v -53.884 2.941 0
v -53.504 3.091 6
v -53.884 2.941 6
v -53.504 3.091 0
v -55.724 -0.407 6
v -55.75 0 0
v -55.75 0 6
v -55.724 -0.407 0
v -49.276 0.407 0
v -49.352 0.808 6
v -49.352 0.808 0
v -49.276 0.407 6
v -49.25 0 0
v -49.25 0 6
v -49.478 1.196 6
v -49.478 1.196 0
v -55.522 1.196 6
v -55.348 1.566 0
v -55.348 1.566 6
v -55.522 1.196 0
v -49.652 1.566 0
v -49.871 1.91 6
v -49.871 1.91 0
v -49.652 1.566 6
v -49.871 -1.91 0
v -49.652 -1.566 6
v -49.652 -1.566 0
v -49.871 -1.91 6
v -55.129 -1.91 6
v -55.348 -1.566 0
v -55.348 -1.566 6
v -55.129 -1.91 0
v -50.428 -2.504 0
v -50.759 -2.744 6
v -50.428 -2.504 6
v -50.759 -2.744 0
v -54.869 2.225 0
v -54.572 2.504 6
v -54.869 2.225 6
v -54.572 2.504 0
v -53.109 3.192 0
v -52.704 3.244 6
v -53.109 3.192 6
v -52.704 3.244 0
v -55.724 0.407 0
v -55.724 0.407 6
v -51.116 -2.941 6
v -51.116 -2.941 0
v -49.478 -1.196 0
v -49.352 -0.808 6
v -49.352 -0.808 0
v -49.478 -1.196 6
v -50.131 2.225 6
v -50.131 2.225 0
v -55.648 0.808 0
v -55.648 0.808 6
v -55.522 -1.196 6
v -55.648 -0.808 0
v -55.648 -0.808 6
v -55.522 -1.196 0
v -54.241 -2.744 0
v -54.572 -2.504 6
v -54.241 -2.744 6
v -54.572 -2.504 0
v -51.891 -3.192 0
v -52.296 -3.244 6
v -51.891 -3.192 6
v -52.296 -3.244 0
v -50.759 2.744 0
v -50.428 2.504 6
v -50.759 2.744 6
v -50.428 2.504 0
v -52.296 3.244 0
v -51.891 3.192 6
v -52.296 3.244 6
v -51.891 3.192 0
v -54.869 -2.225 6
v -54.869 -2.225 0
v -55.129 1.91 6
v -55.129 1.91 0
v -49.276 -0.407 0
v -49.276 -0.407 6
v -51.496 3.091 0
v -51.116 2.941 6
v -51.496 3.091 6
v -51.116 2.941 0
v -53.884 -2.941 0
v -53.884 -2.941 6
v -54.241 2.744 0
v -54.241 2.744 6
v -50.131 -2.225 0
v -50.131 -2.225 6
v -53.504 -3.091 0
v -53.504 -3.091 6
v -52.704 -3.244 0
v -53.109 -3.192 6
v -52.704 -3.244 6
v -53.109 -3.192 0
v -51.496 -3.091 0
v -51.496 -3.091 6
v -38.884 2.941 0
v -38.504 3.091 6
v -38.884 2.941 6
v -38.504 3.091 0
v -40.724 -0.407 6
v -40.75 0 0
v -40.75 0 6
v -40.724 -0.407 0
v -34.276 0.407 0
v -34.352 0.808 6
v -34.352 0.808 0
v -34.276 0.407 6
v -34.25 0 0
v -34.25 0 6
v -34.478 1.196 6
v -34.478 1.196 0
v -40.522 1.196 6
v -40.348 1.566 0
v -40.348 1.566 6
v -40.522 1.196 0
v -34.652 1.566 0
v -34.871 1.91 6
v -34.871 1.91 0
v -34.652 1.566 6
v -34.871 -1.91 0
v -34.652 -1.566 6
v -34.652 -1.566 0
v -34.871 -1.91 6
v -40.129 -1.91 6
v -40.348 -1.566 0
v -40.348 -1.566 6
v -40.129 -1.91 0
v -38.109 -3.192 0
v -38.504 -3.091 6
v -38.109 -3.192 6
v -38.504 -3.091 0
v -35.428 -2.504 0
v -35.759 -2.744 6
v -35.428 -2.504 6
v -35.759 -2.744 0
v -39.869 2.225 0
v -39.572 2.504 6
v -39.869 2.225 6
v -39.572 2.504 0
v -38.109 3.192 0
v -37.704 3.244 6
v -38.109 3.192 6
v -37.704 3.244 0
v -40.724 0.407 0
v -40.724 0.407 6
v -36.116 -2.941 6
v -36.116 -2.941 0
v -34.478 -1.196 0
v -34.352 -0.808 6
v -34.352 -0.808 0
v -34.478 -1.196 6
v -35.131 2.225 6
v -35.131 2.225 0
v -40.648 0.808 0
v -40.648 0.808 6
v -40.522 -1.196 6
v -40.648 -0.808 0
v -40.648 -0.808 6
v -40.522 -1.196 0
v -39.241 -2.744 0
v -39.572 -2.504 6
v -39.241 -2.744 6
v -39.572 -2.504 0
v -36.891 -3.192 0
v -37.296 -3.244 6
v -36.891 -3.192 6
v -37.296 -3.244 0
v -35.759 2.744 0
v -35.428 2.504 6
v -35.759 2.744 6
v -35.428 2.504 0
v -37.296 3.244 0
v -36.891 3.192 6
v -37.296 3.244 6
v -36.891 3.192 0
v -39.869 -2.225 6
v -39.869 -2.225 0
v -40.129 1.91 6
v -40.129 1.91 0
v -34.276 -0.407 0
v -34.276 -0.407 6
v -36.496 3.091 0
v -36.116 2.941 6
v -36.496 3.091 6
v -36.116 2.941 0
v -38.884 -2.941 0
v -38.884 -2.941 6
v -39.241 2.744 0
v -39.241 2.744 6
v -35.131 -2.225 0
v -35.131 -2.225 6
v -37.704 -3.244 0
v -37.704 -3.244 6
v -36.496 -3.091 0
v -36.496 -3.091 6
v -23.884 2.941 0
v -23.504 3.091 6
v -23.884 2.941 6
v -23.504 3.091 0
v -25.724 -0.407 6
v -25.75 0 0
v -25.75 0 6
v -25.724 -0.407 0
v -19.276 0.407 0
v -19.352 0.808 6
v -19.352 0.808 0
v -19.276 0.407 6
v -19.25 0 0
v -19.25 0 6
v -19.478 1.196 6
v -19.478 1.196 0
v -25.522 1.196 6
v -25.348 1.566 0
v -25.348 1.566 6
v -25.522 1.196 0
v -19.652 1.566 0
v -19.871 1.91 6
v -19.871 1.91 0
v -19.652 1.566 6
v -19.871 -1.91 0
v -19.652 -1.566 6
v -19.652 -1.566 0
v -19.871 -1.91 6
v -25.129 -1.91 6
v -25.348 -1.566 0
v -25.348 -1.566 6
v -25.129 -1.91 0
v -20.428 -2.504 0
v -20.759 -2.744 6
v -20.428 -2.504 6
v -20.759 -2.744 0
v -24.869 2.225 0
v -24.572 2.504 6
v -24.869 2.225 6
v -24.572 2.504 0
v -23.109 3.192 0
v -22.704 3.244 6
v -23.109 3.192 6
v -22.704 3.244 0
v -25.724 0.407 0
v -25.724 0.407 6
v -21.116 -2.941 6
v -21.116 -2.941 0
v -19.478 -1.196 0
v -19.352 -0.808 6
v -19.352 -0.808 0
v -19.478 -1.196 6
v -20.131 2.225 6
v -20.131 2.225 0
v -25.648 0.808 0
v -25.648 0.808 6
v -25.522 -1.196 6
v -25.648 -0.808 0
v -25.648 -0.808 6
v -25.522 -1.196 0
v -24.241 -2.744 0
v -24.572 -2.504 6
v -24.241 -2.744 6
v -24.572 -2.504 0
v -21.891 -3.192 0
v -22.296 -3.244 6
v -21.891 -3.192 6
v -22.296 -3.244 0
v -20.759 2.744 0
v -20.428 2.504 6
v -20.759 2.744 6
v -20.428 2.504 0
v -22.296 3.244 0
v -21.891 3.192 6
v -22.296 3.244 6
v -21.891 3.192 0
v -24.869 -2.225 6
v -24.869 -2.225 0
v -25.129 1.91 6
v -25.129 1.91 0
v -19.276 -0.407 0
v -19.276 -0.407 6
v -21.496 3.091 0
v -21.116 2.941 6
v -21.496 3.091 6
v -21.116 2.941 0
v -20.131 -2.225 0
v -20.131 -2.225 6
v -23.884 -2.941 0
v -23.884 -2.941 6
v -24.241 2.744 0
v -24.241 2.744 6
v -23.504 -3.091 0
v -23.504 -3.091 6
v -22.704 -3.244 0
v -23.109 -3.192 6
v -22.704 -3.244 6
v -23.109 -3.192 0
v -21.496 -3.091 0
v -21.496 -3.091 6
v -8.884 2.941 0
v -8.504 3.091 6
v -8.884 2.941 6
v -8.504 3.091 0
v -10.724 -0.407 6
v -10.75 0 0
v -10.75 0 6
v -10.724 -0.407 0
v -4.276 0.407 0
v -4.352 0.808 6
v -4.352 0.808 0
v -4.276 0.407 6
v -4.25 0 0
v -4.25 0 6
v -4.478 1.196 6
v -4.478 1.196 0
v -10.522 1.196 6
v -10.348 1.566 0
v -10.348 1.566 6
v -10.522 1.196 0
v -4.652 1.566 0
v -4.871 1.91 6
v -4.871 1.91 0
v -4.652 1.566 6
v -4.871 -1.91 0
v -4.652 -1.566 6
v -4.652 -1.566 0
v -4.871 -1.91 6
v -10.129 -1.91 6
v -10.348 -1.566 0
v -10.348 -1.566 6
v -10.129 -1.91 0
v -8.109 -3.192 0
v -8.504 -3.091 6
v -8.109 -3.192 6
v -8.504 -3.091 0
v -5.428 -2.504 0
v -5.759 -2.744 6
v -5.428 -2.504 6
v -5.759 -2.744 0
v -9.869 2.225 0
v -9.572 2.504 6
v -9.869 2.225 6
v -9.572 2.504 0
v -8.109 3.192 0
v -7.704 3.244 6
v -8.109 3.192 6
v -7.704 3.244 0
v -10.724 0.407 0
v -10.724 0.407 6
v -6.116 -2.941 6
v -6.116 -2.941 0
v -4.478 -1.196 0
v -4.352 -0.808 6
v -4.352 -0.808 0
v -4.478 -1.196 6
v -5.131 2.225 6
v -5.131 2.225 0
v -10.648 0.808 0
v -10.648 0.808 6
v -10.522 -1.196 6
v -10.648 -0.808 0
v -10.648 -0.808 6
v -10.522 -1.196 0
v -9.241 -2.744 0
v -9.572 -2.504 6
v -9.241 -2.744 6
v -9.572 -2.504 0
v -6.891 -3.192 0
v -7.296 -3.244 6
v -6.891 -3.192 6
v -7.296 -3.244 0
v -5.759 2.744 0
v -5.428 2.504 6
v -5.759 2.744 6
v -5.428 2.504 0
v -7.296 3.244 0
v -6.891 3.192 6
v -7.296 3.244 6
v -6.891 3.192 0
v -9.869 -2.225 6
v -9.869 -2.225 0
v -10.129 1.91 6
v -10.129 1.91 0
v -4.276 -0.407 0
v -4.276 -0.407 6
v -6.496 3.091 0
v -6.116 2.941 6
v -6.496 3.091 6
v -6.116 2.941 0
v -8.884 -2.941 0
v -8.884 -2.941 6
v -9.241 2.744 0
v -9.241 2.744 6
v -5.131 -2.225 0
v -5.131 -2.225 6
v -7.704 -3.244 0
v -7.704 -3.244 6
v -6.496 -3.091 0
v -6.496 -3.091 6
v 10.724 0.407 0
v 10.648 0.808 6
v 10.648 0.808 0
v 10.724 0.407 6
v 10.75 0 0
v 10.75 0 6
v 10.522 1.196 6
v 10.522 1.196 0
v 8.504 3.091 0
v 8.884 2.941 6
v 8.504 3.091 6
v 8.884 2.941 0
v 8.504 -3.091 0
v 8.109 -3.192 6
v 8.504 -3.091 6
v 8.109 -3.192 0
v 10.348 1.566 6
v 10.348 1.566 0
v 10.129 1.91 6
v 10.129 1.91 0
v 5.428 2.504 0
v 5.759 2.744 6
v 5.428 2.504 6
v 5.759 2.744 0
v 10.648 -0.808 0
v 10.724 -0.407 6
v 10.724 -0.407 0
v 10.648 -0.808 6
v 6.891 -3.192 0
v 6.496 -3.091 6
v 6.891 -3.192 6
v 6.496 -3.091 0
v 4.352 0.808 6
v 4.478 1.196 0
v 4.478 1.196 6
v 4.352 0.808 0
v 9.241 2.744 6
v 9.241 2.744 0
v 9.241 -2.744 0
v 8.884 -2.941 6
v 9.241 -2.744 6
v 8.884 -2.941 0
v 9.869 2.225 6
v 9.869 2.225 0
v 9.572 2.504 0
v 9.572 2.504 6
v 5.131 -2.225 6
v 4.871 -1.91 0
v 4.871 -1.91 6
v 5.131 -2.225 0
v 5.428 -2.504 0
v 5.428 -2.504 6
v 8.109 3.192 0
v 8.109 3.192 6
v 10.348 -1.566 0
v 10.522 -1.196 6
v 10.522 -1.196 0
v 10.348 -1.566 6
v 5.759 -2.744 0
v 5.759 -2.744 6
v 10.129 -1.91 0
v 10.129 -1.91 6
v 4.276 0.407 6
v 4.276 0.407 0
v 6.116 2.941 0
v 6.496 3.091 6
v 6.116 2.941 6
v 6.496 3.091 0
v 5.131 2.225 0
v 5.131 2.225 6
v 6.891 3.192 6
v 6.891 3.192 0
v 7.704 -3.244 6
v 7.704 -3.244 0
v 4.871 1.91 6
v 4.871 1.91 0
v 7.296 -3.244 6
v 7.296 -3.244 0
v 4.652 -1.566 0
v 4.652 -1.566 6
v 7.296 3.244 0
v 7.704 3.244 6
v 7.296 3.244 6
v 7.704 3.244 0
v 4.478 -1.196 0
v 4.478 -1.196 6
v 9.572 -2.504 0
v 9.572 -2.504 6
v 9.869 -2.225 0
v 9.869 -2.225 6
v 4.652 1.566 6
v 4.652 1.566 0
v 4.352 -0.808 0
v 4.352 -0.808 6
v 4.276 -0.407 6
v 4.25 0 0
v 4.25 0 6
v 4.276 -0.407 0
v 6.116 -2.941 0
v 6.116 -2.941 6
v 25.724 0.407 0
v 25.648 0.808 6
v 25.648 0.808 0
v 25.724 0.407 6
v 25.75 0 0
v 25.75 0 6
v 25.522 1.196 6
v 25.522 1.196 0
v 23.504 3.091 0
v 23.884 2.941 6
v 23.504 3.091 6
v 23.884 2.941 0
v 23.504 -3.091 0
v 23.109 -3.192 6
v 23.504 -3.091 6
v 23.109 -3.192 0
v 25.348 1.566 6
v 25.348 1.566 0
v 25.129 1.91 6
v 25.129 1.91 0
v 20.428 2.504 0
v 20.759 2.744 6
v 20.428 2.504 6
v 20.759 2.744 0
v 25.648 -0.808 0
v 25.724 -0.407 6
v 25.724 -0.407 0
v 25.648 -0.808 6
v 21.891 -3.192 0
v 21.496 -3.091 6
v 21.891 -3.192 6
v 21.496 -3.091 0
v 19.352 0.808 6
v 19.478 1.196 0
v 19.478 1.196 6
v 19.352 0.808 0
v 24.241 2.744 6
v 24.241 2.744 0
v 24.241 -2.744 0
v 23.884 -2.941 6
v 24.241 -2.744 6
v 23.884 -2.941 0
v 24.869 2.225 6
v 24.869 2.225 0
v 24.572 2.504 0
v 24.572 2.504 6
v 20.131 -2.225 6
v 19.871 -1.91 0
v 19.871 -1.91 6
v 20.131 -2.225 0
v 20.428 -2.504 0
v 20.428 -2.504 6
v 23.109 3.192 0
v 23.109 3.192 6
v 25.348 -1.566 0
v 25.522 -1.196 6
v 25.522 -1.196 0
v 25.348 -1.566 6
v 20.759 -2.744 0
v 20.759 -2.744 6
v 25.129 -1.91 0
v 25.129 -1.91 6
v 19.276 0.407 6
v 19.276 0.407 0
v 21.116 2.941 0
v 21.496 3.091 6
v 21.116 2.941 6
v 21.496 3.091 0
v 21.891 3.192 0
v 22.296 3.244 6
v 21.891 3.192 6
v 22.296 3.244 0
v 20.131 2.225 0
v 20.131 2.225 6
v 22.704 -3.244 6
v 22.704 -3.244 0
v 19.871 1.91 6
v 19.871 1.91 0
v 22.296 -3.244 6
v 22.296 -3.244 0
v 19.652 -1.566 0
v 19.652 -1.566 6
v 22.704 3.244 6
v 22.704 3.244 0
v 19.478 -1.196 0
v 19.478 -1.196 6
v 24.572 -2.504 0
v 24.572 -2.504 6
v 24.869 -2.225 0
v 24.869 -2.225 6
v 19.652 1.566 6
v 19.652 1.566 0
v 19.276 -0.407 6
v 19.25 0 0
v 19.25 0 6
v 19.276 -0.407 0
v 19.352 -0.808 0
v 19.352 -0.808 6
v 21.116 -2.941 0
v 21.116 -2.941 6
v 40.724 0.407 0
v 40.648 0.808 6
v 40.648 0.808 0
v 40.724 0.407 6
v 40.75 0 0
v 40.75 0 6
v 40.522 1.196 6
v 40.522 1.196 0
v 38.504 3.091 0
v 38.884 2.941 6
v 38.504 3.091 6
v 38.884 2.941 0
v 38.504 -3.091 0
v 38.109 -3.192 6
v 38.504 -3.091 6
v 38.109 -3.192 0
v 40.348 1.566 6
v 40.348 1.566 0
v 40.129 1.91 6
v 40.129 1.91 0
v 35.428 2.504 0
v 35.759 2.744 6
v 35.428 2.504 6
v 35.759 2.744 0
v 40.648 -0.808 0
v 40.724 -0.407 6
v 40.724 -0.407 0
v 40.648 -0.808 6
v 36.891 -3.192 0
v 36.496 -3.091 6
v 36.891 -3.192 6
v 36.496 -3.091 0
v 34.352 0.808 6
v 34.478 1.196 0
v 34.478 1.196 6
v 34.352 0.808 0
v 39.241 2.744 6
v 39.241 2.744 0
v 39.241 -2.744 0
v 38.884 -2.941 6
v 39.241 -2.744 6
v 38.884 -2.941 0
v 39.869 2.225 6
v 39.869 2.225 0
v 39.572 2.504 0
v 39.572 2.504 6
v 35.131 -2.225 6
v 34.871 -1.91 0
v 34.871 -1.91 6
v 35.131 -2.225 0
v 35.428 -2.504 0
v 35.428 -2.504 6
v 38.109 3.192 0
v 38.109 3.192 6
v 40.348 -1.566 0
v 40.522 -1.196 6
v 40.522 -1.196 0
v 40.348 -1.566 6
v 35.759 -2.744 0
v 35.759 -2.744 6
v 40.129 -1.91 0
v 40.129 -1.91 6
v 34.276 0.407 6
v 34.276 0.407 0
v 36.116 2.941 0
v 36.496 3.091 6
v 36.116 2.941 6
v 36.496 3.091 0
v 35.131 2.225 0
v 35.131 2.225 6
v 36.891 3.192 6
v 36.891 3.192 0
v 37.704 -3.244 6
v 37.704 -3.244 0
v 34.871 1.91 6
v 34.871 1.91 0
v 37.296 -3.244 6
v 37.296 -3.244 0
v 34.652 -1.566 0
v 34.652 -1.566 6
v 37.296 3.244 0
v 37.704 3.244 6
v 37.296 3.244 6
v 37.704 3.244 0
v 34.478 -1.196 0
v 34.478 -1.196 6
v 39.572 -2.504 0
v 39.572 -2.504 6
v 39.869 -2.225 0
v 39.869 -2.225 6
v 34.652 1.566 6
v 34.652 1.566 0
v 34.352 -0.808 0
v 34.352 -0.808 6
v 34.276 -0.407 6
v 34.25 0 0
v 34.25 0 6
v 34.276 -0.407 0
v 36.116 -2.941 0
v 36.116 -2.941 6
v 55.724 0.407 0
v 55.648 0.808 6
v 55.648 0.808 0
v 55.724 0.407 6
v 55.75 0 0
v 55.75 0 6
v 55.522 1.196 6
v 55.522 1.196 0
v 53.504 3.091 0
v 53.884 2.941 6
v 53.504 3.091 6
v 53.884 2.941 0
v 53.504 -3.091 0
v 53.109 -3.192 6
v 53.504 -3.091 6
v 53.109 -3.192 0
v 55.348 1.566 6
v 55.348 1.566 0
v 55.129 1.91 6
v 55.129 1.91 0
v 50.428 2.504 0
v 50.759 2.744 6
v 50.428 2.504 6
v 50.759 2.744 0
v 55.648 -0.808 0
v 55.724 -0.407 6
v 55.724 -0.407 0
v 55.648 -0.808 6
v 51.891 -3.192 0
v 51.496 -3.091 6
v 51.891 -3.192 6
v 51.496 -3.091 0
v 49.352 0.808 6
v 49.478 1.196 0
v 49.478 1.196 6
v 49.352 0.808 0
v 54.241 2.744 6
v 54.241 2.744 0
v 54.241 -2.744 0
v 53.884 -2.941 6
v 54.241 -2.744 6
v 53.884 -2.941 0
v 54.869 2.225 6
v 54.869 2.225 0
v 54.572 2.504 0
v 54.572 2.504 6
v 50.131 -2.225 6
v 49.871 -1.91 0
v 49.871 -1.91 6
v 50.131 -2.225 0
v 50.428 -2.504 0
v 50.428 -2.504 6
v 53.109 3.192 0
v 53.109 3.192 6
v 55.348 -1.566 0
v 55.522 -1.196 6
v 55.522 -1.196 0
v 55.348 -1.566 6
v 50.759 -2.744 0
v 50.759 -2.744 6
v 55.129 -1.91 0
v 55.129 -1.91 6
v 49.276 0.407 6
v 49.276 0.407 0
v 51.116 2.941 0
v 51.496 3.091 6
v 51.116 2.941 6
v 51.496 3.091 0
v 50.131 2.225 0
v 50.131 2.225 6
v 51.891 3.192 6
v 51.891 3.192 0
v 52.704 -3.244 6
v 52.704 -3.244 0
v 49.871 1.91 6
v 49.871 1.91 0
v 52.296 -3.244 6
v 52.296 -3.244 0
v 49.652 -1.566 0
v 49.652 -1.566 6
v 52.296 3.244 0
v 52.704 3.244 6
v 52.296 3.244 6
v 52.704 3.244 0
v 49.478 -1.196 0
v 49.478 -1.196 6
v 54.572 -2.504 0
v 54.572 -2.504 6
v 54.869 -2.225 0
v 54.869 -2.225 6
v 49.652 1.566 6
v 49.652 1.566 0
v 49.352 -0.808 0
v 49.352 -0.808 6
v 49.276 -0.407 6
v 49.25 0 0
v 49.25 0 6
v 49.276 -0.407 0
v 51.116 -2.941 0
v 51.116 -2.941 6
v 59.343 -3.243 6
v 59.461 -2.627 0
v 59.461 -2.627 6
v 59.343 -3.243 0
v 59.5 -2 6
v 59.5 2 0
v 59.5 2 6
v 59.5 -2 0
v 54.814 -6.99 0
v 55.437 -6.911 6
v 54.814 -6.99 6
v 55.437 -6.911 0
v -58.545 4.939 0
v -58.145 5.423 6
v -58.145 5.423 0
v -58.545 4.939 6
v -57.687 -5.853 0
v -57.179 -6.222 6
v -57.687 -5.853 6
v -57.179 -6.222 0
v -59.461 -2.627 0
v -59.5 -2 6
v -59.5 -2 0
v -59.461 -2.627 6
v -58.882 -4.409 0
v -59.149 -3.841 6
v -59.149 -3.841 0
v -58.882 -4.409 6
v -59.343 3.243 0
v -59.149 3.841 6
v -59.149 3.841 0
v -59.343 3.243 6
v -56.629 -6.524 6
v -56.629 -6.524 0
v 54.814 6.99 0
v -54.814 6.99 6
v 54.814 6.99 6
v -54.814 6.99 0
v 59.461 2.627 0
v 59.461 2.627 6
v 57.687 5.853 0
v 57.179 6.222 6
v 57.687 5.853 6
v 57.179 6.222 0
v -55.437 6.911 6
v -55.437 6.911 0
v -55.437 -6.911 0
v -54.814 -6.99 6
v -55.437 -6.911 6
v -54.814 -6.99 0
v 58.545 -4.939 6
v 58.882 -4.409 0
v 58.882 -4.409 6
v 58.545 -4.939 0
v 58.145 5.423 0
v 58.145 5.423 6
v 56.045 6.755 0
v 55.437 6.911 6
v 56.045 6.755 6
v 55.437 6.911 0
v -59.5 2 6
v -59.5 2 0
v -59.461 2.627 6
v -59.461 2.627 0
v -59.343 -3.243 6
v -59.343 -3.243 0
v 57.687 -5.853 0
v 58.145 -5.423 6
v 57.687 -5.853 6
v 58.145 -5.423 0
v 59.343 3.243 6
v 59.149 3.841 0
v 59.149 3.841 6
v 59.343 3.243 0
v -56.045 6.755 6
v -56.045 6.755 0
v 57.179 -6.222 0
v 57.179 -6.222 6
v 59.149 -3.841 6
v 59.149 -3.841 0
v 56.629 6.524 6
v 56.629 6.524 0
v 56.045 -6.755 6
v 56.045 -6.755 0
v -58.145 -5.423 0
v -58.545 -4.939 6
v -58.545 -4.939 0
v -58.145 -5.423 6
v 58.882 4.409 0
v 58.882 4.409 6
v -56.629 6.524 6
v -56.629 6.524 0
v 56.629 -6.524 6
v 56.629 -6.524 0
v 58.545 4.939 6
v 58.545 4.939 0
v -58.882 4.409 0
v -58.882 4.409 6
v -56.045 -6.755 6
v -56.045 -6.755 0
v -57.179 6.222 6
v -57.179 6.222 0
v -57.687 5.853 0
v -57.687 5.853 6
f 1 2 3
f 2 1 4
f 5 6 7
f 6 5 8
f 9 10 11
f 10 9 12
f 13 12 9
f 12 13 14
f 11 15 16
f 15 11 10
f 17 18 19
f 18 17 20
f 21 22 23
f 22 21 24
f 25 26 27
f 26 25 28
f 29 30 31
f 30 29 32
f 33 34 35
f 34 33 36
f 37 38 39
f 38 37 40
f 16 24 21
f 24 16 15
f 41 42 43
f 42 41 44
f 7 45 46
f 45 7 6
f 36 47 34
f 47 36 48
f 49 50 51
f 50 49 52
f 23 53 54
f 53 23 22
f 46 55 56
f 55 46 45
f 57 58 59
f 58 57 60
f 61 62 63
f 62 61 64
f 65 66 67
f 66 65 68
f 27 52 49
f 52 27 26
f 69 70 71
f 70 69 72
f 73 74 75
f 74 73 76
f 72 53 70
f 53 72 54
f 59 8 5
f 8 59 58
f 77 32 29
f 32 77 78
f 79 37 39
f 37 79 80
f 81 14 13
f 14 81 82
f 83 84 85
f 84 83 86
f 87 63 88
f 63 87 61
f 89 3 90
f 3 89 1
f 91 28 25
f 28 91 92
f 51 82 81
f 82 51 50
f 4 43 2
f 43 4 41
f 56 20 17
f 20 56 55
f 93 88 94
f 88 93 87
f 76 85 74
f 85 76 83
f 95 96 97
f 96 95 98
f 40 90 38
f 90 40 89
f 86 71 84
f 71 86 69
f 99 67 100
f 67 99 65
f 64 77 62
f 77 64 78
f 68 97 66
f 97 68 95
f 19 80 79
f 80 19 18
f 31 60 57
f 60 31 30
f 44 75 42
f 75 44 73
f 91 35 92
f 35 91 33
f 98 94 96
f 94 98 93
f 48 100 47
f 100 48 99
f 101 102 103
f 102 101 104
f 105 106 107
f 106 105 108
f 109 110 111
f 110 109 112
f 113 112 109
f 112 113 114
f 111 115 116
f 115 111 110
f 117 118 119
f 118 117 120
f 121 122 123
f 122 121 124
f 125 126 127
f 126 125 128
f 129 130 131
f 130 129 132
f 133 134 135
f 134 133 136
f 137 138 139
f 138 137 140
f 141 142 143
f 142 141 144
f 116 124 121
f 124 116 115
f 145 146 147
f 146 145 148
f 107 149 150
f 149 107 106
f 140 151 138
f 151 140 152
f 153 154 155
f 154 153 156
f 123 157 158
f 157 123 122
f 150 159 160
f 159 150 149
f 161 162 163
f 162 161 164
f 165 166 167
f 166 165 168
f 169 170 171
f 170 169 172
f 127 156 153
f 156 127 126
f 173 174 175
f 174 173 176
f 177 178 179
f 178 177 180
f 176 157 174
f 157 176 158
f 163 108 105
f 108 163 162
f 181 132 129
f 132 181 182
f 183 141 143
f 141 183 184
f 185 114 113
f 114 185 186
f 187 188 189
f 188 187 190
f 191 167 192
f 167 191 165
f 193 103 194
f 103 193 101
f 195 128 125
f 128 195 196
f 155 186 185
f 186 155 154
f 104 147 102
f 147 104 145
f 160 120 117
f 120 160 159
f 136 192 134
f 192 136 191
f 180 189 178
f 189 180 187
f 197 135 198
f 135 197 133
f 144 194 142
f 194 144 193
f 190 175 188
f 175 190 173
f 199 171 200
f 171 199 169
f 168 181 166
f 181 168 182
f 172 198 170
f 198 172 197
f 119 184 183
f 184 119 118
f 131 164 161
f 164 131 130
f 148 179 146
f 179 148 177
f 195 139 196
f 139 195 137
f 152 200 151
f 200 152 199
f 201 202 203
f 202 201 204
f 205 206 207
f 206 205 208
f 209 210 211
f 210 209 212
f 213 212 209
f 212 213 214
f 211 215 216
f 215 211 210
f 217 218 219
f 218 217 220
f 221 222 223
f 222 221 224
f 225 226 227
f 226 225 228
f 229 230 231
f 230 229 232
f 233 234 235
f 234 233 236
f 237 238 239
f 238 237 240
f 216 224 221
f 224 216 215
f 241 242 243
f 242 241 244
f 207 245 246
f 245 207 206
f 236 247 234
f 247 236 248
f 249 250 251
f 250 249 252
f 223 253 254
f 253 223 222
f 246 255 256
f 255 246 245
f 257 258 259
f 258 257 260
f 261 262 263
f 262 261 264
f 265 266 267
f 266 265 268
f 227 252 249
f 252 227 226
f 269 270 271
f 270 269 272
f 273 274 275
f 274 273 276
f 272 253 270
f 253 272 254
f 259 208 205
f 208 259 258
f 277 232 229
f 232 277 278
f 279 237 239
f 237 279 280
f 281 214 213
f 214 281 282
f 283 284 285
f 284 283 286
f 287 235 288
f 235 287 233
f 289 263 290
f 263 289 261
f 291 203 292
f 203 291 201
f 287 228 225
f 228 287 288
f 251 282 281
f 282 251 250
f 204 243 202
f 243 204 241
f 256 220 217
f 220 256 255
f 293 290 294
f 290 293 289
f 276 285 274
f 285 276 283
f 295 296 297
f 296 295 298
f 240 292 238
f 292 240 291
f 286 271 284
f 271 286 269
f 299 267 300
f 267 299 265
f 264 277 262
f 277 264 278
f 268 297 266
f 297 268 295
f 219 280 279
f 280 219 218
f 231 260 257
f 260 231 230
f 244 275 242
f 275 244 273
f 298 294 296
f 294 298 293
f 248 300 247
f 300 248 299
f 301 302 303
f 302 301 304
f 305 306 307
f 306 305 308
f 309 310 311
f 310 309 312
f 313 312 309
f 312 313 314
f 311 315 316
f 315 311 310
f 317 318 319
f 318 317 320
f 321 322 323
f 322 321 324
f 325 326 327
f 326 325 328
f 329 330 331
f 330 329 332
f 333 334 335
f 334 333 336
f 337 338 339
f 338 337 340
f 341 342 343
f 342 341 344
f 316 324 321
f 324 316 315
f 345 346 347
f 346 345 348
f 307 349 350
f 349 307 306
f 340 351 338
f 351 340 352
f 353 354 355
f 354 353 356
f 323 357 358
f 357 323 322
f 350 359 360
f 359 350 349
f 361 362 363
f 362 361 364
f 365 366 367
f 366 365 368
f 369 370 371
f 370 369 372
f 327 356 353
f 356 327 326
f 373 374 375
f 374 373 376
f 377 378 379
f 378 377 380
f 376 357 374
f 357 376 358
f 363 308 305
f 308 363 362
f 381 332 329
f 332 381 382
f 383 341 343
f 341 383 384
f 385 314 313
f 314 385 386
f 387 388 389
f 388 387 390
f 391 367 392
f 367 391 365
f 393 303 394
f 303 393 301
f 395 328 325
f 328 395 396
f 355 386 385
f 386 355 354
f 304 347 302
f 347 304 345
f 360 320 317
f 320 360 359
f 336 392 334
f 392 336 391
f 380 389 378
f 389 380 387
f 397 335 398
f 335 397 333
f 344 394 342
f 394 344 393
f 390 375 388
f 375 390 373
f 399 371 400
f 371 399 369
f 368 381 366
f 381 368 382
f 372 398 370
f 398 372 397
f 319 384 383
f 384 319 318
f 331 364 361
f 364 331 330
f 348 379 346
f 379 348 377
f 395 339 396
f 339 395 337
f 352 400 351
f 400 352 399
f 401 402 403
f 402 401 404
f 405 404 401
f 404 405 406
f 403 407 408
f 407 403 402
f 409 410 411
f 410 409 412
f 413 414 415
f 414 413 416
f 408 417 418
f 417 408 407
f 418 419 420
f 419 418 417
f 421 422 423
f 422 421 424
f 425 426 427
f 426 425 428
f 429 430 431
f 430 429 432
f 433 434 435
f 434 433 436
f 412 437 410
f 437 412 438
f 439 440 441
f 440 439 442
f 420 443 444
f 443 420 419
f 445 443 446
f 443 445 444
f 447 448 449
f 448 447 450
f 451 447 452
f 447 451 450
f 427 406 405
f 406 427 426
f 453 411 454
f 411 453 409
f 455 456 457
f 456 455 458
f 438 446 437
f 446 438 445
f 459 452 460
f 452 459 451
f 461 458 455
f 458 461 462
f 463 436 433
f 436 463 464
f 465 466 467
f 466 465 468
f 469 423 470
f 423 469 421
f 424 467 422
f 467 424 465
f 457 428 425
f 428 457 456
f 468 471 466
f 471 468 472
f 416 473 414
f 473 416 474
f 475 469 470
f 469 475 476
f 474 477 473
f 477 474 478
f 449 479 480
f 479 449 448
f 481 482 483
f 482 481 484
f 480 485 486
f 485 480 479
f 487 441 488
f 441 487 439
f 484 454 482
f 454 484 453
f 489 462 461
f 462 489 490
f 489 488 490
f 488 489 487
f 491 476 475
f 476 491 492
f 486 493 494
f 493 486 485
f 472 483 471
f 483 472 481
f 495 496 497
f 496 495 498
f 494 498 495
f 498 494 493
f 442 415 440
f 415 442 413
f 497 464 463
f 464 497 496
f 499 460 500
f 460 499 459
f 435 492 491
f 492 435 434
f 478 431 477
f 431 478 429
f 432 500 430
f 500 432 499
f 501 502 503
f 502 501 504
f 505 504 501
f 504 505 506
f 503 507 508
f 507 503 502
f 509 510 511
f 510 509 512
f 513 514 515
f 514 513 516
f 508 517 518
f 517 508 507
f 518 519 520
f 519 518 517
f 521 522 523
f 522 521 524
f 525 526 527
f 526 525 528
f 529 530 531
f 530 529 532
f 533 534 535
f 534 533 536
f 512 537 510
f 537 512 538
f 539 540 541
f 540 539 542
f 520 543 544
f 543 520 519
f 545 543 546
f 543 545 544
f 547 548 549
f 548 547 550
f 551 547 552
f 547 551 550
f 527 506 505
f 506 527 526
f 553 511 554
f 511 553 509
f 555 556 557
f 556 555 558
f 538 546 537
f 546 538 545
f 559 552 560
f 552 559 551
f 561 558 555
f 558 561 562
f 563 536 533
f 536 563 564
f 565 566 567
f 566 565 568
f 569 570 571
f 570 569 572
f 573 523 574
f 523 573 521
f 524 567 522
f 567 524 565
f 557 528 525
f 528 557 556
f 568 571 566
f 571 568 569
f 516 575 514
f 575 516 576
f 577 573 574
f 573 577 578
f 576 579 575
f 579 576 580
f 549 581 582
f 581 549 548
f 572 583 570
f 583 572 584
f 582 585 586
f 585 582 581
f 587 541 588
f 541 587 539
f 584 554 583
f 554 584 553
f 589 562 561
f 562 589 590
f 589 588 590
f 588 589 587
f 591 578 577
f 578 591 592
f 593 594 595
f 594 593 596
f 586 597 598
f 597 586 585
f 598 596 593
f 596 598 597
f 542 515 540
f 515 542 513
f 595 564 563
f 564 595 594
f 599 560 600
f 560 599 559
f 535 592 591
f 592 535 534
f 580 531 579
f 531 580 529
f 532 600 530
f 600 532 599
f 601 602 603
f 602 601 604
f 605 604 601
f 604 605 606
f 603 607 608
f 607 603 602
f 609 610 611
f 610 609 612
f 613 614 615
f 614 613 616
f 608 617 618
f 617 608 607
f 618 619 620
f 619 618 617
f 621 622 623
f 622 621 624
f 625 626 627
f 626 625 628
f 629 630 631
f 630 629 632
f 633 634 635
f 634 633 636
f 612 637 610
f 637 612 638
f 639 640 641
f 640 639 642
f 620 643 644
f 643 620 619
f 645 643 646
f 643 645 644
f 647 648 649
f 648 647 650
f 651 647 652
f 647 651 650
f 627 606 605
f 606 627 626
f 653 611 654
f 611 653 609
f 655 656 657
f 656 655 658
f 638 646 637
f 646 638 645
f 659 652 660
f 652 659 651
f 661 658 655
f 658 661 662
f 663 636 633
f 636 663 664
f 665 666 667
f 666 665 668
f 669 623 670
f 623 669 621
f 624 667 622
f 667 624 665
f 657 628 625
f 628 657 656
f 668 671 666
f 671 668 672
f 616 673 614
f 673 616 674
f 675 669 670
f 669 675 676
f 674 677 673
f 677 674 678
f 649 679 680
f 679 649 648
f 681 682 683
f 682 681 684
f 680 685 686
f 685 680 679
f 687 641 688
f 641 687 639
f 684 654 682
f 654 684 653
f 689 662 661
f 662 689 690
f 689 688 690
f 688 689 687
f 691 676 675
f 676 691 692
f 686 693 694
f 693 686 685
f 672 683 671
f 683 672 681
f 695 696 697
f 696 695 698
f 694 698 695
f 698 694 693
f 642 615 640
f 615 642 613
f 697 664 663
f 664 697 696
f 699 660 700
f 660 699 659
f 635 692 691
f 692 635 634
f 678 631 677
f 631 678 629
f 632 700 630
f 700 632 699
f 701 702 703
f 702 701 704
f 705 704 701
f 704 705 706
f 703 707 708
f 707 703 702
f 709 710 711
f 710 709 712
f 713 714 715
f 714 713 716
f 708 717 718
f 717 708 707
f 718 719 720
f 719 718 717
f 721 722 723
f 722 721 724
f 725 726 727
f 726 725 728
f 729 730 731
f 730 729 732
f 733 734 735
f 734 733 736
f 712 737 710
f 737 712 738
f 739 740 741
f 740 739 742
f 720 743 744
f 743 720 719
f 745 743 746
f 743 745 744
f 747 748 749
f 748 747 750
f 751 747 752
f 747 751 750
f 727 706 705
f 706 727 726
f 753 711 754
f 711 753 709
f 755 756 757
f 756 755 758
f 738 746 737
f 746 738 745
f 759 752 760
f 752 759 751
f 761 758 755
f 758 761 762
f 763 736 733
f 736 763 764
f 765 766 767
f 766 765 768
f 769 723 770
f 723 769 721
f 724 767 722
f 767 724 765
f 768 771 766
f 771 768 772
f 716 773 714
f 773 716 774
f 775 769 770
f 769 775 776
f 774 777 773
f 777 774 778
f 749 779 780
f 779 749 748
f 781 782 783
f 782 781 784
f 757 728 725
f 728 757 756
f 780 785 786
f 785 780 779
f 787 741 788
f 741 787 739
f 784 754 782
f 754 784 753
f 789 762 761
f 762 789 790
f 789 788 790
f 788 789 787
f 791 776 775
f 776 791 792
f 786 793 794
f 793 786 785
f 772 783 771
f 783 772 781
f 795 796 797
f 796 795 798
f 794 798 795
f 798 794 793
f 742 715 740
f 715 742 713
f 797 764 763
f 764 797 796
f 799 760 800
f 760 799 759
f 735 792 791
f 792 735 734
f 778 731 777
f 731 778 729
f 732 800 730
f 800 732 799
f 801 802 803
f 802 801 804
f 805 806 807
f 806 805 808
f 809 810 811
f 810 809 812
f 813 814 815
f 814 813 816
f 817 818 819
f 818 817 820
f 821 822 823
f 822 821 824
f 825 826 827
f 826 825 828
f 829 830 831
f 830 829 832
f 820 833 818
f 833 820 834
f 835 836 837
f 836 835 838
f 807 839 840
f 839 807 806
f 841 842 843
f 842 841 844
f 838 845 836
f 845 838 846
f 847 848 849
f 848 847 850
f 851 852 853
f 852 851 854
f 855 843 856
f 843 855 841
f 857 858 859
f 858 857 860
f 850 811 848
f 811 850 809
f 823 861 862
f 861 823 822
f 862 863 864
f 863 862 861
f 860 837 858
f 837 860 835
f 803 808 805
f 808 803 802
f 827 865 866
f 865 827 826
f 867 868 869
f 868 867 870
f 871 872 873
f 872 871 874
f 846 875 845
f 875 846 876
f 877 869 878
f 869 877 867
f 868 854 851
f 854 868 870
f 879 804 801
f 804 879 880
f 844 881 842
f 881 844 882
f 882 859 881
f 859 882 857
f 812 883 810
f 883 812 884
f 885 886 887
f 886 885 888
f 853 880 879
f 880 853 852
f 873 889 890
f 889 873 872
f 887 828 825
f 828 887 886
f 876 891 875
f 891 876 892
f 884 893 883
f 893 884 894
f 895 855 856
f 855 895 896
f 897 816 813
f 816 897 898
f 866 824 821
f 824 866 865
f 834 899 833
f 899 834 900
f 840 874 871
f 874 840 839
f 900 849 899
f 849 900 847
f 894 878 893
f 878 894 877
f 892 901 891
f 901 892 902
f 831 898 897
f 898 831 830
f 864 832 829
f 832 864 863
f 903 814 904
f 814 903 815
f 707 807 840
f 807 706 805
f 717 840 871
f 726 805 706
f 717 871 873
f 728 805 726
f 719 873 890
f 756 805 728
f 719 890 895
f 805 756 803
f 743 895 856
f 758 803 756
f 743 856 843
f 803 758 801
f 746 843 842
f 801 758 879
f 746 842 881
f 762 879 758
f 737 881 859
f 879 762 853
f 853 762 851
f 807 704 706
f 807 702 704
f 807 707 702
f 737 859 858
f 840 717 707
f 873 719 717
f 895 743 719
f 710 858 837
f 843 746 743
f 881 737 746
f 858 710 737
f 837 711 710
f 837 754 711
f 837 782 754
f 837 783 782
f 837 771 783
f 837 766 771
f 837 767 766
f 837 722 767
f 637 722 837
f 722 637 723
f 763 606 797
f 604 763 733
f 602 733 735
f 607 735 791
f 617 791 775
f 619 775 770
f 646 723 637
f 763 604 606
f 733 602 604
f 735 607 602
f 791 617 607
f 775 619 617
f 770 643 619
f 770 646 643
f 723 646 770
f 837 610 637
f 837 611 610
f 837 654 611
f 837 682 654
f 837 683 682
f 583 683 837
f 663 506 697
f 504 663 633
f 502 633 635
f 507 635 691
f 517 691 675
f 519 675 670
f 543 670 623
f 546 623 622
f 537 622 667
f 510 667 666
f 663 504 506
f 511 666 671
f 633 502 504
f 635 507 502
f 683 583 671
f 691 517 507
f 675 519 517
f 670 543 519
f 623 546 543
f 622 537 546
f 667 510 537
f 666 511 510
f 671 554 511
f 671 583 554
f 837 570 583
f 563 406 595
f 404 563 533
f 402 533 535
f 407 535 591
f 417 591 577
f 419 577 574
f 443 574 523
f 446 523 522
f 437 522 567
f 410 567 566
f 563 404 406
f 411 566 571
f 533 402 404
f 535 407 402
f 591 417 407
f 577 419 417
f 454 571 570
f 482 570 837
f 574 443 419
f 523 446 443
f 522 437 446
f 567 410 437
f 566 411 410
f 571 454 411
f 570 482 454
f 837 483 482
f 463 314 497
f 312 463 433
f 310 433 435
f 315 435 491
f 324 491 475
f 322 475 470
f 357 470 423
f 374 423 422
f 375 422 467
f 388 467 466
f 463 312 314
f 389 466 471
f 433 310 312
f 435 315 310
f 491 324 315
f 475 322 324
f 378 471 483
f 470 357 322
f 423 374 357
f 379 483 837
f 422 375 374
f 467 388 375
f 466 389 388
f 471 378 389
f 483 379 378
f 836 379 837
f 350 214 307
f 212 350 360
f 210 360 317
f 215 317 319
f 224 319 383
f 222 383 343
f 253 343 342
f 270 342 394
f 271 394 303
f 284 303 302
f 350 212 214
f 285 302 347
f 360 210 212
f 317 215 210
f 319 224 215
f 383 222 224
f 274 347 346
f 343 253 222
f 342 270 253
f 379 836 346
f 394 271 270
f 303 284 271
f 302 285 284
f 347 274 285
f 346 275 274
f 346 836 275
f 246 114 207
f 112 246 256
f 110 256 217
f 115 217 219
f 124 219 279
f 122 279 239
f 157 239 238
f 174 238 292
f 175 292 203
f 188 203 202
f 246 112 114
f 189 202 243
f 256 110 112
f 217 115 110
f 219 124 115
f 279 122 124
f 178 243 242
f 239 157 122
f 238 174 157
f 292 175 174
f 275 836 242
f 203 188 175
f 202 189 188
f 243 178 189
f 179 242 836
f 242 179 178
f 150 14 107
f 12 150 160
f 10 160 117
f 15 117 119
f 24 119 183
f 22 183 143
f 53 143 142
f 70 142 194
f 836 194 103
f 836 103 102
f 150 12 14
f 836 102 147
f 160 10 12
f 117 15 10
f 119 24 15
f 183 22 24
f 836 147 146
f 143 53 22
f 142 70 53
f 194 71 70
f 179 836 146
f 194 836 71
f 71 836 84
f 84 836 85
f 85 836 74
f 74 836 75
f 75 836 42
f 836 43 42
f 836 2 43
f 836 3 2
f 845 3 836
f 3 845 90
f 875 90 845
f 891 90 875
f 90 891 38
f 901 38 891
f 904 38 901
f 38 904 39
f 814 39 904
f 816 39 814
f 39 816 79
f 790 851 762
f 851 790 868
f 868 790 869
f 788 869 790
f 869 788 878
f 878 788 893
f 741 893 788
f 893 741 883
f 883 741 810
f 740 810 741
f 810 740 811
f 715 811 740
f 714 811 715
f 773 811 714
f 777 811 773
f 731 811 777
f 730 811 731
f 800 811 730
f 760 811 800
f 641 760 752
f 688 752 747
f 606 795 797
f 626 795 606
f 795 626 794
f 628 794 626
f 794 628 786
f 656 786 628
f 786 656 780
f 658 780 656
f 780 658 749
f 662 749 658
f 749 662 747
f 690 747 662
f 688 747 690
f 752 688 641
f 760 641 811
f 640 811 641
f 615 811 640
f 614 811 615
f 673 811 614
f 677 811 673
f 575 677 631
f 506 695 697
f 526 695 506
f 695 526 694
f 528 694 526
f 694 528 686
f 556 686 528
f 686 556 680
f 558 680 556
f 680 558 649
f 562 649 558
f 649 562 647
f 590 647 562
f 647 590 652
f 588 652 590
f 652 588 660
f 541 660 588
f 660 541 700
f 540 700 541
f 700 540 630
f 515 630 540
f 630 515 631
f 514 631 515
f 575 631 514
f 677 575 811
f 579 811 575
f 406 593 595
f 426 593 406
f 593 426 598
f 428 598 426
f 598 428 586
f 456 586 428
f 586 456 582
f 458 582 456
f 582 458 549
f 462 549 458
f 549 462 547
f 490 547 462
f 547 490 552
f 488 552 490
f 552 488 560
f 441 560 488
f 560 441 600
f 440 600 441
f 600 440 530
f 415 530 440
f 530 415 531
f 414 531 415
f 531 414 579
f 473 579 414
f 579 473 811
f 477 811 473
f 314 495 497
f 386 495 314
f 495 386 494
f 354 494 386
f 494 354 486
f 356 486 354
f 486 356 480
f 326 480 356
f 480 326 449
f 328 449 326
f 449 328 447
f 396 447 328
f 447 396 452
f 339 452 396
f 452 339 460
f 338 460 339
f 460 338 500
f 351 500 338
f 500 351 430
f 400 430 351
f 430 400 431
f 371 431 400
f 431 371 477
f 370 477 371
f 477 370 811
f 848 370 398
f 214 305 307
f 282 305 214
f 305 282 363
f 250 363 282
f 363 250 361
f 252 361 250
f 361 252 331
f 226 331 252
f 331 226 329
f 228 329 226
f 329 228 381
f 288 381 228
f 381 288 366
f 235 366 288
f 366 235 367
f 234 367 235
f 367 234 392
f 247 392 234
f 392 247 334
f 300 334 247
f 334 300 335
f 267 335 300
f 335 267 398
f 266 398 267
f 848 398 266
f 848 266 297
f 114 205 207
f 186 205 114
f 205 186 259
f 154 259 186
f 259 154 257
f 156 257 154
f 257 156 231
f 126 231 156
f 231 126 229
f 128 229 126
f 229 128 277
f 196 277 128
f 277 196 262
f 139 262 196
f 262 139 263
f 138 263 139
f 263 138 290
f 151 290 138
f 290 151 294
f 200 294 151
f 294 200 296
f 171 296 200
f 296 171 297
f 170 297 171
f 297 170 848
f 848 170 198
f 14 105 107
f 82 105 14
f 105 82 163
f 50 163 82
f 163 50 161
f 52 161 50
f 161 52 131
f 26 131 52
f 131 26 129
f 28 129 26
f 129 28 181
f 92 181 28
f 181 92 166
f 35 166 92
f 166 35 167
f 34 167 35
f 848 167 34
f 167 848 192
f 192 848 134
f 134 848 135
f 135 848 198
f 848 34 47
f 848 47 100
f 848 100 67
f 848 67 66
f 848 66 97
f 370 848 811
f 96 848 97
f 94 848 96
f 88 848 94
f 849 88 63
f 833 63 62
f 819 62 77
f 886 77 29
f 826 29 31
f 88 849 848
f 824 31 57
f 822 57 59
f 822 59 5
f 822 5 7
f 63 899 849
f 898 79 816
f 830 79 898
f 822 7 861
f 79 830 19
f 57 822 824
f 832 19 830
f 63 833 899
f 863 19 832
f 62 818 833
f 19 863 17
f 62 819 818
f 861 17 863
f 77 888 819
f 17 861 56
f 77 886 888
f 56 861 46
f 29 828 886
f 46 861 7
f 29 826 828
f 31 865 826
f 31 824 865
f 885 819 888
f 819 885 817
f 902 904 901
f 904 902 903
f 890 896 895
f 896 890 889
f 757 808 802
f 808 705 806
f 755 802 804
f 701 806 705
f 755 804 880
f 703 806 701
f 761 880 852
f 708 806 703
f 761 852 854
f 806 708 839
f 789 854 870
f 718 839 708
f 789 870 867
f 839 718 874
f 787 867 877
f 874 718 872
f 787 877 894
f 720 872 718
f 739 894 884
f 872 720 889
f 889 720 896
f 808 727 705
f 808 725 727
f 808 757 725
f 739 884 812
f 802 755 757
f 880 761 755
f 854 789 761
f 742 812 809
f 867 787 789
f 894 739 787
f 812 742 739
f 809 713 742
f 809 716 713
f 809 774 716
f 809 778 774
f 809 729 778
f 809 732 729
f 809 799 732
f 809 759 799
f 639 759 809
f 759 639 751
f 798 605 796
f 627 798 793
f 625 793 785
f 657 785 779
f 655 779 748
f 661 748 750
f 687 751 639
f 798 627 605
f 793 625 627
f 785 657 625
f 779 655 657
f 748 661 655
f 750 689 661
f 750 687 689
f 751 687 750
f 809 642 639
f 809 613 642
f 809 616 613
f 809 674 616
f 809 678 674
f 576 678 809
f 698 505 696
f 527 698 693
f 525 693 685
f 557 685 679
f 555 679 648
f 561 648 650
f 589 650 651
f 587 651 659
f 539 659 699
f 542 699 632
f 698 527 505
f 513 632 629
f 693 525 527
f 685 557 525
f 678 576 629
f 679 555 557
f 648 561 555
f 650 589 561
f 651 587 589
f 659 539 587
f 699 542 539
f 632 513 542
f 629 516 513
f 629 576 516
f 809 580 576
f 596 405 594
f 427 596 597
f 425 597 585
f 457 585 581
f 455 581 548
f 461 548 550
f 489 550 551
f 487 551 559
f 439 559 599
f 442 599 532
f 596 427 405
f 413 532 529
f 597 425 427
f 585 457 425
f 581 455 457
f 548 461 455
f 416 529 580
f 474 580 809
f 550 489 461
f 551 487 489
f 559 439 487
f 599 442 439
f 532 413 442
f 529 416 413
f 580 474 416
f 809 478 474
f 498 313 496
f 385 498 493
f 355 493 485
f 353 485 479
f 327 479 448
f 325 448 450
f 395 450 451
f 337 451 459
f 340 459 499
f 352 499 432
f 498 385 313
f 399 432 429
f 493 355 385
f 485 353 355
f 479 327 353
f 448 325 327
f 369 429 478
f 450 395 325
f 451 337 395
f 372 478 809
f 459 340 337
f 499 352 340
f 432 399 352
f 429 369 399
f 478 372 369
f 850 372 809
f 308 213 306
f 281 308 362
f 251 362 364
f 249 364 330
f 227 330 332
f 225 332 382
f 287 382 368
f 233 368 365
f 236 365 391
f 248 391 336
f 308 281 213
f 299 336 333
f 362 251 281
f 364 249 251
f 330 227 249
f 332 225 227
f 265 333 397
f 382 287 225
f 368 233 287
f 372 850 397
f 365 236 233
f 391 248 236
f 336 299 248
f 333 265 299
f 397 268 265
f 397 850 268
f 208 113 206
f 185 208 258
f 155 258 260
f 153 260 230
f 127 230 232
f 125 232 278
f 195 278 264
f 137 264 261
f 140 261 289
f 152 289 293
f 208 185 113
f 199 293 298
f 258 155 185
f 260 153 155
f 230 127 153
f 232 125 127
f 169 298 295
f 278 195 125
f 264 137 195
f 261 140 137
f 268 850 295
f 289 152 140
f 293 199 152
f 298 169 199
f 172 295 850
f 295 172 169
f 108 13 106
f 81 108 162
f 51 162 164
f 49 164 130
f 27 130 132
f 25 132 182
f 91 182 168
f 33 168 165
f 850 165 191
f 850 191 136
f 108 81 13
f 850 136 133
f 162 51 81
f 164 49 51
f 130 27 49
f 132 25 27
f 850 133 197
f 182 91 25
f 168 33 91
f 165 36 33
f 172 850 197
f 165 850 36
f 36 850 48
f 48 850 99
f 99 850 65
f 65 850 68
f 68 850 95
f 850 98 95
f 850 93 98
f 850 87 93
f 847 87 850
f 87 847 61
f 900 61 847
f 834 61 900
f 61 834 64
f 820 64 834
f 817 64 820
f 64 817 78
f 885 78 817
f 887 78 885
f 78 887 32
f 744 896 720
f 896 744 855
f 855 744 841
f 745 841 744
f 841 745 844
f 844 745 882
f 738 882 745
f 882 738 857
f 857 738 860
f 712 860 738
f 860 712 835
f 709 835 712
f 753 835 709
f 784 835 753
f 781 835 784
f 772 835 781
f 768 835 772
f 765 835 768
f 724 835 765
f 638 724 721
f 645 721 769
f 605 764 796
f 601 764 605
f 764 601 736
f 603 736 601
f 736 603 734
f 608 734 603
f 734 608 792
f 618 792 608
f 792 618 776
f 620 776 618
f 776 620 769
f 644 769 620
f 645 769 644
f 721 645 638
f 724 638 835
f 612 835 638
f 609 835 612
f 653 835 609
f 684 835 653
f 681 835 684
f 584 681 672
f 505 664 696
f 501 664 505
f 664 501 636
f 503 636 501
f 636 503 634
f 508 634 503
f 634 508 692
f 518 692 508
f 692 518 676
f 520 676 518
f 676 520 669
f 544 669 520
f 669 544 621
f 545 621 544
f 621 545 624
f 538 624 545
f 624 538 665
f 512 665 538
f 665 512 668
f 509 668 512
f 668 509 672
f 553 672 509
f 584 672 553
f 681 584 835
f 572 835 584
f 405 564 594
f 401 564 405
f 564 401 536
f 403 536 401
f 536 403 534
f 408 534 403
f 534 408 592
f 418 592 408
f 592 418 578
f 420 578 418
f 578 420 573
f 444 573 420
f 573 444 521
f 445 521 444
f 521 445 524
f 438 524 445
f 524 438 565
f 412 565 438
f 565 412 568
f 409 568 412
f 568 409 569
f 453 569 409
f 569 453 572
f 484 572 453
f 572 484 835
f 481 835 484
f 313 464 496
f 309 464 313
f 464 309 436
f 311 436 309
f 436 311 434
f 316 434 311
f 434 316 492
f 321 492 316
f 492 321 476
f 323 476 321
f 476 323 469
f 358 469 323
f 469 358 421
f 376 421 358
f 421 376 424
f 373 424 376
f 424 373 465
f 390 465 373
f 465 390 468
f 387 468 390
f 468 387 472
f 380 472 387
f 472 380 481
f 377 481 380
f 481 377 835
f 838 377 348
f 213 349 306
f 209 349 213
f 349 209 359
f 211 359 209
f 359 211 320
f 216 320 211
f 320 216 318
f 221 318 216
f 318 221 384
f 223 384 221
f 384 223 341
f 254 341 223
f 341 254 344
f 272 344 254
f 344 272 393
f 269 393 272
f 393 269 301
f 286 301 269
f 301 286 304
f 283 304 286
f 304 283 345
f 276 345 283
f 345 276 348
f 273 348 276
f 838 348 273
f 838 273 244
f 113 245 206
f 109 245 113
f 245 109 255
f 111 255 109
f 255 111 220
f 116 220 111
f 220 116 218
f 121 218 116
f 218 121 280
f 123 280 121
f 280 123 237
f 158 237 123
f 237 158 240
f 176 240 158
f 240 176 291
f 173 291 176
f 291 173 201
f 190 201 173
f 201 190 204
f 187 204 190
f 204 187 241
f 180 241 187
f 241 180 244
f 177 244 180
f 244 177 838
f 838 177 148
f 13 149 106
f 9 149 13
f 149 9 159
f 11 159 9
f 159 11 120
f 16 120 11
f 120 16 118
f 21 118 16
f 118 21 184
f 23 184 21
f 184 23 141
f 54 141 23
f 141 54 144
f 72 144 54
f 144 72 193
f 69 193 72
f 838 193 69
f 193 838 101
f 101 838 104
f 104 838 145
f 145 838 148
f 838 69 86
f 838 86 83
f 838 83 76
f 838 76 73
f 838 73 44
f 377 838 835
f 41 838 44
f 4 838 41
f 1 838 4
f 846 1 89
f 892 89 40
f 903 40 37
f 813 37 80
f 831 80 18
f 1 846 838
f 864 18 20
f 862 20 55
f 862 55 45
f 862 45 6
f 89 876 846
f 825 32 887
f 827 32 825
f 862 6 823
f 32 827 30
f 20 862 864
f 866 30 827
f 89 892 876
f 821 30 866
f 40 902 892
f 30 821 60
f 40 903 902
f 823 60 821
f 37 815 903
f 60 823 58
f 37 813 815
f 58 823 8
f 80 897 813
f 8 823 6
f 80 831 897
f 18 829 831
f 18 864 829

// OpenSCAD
$fn = 50;


difference() {
	union() {
		hull() {
			translate(v = [-54.5000000000, 2.0000000000, 0]) {
				cylinder(h = 6, r = 5);
			}
			translate(v = [54.5000000000, 2.0000000000, 0]) {
				cylinder(h = 6, r = 5);
			}
			translate(v = [-54.5000000000, -2.0000000000, 0]) {
				cylinder(h = 6, r = 5);
			}
			translate(v = [54.5000000000, -2.0000000000, 0]) {
				cylinder(h = 6, r = 5);
			}
		}
	}
	union() {
		translate(v = [-52.5000000000, 0.0000000000, -100.0000000000]) {
			cylinder(h = 200, r = 3.2500000000);
		}
		translate(v = [-37.5000000000, 0.0000000000, -100.0000000000]) {
			cylinder(h = 200, r = 3.2500000000);
		}
		translate(v = [-22.5000000000, 0.0000000000, -100.0000000000]) {
			cylinder(h = 200, r = 3.2500000000);
		}
		translate(v = [-7.5000000000, 0.0000000000, -100.0000000000]) {
			cylinder(h = 200, r = 3.2500000000);
		}
		translate(v = [7.5000000000, 0.0000000000, -100.0000000000]) {
			cylinder(h = 200, r = 3.2500000000);
		}
		translate(v = [22.5000000000, 0.0000000000, -100.0000000000]) {
			cylinder(h = 200, r = 3.2500000000);
		}
		translate(v = [37.5000000000, 0.0000000000, -100.0000000000]) {
			cylinder(h = 200, r = 3.2500000000);
		}
		translate(v = [52.5000000000, 0.0000000000, -100.0000000000]) {
			cylinder(h = 200, r = 3.2500000000);
		}
	}
}
